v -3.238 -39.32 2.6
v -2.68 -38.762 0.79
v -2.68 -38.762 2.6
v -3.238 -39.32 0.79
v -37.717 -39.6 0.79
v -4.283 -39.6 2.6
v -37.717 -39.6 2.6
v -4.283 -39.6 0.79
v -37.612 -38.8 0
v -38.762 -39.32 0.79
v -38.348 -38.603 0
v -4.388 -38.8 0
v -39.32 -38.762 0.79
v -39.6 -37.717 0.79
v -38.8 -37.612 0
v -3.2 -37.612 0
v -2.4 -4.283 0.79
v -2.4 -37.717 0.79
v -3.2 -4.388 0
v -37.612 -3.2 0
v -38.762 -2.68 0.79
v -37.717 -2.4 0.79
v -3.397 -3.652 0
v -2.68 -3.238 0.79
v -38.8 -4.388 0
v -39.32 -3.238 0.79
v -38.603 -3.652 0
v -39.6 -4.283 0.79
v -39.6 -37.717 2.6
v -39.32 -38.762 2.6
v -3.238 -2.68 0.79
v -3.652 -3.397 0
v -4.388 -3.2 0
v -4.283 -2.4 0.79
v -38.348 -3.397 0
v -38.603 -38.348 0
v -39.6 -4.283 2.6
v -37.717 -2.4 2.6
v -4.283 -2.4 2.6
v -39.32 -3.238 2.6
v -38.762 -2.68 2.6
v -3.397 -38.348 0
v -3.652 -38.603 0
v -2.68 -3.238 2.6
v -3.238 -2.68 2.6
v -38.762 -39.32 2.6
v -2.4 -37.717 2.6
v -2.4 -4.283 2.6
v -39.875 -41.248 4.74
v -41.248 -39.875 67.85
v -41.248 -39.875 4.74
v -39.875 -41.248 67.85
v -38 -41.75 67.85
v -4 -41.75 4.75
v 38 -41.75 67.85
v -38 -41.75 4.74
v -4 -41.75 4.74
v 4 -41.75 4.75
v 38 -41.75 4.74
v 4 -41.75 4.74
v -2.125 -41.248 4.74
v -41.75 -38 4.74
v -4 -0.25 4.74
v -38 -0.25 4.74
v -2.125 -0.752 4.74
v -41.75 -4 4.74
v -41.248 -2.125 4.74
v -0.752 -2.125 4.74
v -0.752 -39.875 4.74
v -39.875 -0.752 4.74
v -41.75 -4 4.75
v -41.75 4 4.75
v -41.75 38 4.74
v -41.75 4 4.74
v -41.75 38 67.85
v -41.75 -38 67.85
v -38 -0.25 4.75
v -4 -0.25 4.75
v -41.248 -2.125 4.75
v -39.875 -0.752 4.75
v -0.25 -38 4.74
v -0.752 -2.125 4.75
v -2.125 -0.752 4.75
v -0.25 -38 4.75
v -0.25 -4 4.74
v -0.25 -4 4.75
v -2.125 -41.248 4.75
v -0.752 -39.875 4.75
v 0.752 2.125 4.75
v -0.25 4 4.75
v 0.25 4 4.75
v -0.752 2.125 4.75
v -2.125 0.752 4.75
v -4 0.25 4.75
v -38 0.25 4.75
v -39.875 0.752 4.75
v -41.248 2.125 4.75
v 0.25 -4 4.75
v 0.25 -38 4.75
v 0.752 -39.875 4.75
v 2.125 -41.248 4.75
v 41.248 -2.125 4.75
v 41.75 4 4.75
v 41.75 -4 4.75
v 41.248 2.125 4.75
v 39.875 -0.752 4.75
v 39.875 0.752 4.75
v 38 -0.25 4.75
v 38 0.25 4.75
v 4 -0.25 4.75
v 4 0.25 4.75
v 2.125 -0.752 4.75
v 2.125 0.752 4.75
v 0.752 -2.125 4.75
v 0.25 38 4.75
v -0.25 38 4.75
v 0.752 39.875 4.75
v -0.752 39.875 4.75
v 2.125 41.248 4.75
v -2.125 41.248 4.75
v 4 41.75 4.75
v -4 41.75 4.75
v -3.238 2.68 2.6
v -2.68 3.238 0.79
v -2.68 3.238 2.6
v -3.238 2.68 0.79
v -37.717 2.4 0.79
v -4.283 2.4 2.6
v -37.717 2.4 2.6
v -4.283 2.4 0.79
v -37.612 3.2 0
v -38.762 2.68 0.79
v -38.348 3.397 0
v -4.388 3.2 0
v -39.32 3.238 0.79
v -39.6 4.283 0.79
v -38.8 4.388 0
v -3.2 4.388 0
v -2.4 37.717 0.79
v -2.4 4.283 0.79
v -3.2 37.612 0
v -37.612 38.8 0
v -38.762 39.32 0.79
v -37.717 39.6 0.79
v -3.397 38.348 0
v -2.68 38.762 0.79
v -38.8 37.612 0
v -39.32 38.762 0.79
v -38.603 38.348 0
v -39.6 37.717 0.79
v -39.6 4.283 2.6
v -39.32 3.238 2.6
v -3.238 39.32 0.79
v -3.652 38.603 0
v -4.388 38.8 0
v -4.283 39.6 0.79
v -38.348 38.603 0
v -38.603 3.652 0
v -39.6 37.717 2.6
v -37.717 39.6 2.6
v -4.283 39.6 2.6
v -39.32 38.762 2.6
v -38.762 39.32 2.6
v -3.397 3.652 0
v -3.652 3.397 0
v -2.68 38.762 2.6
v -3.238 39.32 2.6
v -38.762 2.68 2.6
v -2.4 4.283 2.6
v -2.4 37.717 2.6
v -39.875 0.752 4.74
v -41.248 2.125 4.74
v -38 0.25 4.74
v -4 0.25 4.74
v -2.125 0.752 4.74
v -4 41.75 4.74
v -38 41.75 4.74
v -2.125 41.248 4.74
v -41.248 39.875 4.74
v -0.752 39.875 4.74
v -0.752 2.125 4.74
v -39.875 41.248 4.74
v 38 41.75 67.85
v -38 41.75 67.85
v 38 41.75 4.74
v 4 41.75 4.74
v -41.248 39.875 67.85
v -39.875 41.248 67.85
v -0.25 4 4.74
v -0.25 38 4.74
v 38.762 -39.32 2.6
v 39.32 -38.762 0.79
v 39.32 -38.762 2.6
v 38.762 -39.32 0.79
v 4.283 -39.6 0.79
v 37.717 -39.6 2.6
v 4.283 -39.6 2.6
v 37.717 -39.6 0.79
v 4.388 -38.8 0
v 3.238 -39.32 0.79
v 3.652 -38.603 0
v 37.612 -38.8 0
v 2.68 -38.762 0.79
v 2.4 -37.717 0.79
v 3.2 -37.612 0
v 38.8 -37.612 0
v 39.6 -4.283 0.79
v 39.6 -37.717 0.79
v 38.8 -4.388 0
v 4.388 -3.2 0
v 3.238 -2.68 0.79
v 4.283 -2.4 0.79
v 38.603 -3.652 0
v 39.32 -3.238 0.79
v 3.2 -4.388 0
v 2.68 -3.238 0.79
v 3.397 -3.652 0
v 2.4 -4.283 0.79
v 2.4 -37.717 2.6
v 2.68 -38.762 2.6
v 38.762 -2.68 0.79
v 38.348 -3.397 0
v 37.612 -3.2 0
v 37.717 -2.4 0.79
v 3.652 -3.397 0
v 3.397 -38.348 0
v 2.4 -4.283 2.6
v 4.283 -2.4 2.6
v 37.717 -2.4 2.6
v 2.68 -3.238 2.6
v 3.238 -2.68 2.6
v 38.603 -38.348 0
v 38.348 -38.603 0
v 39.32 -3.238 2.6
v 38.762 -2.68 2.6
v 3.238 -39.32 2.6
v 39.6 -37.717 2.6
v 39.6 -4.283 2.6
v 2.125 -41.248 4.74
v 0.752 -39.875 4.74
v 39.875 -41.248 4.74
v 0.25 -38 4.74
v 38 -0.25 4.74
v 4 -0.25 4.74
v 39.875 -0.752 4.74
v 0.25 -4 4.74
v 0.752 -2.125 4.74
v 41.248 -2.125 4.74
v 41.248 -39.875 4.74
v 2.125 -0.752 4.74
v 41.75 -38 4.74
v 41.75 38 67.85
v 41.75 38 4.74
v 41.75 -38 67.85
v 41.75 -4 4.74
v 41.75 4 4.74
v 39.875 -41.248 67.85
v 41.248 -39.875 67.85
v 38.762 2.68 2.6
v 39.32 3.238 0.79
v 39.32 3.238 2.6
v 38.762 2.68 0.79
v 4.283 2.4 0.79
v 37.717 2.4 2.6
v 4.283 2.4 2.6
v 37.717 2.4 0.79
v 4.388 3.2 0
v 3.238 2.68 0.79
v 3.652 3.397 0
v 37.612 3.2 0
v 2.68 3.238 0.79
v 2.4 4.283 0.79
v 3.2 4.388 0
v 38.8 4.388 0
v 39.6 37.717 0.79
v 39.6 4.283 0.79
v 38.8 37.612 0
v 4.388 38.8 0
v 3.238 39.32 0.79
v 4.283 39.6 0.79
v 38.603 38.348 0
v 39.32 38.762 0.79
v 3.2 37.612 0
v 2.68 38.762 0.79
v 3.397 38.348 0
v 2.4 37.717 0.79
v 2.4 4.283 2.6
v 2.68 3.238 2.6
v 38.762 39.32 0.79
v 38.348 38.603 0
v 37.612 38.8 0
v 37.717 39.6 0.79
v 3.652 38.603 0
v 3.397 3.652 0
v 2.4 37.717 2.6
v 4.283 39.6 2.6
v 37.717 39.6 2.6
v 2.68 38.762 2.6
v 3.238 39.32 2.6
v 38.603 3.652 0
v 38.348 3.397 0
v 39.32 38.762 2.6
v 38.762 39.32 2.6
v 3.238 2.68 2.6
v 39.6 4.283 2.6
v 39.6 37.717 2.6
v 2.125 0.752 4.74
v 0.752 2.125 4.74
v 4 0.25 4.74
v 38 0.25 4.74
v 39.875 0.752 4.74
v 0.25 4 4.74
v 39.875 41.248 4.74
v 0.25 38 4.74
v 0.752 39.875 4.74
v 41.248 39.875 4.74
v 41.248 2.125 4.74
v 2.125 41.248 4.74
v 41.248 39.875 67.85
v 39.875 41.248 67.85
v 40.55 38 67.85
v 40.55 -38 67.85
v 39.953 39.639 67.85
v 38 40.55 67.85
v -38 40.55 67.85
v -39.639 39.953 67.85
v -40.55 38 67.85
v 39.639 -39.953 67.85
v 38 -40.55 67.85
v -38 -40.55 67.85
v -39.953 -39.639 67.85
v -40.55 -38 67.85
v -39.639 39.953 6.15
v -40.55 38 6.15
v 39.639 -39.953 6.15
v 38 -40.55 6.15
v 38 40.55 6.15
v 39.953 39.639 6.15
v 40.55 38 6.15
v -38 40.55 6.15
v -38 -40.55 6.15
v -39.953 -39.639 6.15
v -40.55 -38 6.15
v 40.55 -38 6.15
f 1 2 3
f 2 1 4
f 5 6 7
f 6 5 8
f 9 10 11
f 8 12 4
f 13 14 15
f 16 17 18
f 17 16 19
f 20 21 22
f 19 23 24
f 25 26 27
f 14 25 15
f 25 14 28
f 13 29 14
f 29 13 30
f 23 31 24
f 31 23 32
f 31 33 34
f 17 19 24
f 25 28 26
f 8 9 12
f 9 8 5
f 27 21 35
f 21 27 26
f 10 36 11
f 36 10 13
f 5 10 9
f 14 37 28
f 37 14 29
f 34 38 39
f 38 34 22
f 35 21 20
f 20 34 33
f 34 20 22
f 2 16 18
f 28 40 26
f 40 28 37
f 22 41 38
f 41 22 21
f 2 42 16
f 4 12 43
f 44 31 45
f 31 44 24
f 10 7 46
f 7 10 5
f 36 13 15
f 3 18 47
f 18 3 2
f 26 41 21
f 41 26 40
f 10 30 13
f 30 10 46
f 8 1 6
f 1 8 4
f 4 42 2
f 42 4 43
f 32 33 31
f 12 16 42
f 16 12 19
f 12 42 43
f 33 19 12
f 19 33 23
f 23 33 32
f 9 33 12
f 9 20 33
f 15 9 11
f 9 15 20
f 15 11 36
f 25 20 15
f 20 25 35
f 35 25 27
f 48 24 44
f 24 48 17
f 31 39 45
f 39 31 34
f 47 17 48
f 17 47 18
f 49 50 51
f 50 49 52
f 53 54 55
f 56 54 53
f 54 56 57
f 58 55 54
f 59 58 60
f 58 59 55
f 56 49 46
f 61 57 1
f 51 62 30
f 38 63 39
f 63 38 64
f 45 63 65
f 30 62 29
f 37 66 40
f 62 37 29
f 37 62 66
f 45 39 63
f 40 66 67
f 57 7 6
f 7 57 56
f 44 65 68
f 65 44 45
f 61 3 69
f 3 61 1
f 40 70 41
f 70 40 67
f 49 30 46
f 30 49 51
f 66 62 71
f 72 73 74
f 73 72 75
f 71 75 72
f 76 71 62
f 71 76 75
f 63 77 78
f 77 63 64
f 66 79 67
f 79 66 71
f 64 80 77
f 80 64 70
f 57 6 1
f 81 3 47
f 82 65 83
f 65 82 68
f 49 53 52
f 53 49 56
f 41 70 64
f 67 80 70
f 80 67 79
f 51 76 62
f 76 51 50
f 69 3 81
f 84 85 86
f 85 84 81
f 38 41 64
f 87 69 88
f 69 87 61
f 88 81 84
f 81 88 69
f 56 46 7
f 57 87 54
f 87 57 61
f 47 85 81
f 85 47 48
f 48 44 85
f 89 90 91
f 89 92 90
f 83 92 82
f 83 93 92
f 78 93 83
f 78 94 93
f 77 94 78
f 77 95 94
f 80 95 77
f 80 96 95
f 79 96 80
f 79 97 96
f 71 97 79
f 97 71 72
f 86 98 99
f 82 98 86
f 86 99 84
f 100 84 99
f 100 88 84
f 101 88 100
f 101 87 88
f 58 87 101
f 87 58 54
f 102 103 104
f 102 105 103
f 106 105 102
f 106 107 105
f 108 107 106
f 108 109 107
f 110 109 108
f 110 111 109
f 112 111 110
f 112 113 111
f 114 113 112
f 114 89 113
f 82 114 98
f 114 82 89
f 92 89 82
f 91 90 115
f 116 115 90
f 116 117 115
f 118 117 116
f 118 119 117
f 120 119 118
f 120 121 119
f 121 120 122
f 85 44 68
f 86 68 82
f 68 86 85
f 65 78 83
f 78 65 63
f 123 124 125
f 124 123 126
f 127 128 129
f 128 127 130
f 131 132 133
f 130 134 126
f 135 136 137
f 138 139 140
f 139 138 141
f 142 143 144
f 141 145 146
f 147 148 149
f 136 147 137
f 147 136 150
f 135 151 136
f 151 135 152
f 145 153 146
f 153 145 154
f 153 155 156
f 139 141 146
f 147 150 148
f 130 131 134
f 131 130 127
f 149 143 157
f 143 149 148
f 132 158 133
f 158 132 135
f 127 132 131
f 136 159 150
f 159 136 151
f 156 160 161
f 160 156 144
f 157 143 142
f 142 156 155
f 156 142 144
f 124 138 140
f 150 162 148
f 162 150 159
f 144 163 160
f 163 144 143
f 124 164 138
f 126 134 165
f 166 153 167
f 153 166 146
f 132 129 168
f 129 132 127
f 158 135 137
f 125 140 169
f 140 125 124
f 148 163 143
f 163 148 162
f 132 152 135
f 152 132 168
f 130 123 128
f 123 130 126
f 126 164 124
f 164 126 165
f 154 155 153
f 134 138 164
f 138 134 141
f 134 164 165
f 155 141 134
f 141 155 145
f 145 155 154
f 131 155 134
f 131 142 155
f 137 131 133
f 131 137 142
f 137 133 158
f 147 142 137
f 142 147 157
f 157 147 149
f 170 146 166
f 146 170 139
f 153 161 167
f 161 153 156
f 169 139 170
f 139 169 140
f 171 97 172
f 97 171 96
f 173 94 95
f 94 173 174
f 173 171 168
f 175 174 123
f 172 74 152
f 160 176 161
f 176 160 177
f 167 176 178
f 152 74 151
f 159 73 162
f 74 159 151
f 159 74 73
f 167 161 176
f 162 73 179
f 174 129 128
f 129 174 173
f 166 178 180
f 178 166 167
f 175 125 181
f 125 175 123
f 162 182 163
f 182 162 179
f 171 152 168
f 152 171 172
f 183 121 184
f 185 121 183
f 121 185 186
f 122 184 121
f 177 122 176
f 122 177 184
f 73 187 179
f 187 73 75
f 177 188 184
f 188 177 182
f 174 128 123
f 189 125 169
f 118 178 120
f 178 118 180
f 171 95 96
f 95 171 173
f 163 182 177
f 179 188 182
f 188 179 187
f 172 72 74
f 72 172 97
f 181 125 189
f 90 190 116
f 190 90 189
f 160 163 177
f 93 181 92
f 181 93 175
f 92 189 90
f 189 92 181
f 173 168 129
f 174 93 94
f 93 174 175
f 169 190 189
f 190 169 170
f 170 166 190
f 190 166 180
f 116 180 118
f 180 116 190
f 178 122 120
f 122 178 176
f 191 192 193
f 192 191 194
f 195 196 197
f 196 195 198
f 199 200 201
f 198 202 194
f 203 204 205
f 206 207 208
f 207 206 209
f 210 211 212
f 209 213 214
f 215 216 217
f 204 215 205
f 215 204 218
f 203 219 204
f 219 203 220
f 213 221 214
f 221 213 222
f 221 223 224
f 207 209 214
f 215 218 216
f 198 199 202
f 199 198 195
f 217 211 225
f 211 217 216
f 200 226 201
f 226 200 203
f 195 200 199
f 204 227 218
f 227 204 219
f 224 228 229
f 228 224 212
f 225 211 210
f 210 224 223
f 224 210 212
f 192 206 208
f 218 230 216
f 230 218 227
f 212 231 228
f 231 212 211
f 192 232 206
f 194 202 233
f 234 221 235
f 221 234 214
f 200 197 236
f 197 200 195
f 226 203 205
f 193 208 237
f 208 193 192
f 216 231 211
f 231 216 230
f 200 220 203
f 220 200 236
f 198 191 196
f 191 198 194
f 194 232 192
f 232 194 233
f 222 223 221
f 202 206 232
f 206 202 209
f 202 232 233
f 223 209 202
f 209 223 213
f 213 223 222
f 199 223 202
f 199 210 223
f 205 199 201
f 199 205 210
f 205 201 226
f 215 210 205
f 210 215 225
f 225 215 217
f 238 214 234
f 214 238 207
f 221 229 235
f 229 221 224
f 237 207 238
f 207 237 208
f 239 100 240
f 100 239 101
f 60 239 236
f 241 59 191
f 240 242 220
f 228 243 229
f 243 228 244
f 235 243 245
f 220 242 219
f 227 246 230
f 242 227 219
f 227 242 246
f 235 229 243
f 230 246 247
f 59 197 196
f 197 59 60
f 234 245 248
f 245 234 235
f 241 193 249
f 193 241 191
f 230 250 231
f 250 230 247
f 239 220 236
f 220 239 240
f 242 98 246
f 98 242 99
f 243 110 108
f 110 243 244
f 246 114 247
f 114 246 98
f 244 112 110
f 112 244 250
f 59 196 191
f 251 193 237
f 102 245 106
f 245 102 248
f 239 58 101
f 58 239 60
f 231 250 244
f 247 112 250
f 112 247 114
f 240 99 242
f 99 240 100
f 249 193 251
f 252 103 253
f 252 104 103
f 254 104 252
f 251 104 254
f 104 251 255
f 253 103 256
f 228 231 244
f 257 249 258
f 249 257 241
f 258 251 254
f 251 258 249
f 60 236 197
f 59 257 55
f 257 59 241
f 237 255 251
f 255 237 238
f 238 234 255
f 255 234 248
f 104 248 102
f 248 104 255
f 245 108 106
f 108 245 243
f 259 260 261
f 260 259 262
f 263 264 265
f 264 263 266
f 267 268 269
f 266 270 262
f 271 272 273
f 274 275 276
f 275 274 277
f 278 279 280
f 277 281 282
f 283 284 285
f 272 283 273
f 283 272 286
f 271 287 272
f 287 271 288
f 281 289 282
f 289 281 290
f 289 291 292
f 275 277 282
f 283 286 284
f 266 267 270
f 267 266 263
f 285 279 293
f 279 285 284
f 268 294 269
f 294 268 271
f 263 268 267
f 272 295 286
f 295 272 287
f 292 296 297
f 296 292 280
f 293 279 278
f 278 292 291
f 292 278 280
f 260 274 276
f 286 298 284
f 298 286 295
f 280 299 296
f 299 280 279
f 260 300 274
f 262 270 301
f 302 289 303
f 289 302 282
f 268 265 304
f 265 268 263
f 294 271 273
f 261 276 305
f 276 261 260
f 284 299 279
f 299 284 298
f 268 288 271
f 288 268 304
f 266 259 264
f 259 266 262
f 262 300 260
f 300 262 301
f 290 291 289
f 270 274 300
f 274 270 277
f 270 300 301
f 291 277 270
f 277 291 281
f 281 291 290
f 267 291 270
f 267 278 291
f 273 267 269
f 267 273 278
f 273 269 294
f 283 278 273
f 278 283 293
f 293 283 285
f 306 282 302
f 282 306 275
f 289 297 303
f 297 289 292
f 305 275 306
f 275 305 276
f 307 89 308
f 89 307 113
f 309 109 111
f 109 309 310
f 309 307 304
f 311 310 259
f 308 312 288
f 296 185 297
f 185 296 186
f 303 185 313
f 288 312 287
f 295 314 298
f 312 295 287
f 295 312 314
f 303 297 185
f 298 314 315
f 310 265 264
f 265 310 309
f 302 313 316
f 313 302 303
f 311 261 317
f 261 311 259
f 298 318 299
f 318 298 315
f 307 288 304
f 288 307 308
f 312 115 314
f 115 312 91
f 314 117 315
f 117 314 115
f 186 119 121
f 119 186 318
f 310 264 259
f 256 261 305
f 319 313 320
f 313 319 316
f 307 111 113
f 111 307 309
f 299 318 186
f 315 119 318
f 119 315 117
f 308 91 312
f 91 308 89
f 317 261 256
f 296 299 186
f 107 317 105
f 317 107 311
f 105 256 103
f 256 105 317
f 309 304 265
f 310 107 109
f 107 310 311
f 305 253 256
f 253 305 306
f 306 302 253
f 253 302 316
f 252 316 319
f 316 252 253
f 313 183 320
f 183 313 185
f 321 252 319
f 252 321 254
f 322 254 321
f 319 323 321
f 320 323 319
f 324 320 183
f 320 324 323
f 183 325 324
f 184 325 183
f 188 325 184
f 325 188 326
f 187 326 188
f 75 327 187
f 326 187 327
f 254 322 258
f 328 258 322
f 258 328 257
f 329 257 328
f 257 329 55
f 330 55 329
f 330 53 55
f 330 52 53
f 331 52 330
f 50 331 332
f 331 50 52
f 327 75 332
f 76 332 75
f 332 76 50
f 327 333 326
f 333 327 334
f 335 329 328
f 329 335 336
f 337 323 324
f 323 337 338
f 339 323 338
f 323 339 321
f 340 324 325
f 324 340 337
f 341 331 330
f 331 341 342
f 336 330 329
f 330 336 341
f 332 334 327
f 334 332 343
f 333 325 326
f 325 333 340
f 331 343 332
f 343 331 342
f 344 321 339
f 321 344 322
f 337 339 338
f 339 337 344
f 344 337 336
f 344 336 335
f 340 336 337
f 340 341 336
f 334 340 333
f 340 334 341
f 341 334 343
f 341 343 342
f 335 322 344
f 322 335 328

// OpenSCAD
// file: ../lib/vessel.scad
// SPDX-License-Identifier: MIT
// Copyright (c) 2026 Aaron Cupp
//
// vessel.scad — parametric collar cups for bottles, cans, and pen-form tools.
//
// A collar cup is a solid Gridfinity block with cylindrical bores sunk into it.
// It LOCATES a vessel; it does not clamp one. That distinction is the whole
// design: a collar that grips harder than the bin weighs comes out of the
// baseplate with the bottle when you grab it one-handed. Clearance, not
// interference — CLR is per-diameter, not per-side.
//
// Capture depth is roughly a third of the vessel's height. Enough to resist a
// knock (this bench sits under a 180 W fume-extractor intake), not so much that
// you're fishing the bottle out.
//
//   collar_cup(nx, ny, vessel_d, capture_h, …)   — one centred bore
//   collar_cup_multi(nx, ny, bores, capture_h, …) — bores = [[x, y, d], …]
//
// Cord slot: pen-form tools that stand in a cup are usually corded (the HARDELL
// rotary tool takes a barrel jack). Without a slot the lead drapes over the rim
// and levers the tool sideways. `cord_w > 0` cuts a channel from the bore out
// through the wall, open to the top.

include <gridfinity.scad>

CLR      = 1.0;   // bore = vessel_d + CLR. Loose on purpose — see above.
MIN_WALL = 1.2;   // minimum material between two bores, and bore to outer face

// ---- geometry guards ----
// Overlapping bores and bores that break out through the side wall both still
// render as perfectly watertight, 2-manifold meshes — CI cannot tell you the
// part is wrong, only that it is closed. These asserts encode the intent that
// the mesh check can't. Cheap, and they fire at render time rather than on the
// printer.
function _pair_gaps(bores, clr) = [
    for (i = [0 : len(bores)-1], j = [0 : len(bores)-1]) if (i < j)
        norm([bores[i][0]-bores[j][0], bores[i][1]-bores[j][1]])
        - (bores[i][2]+clr)/2 - (bores[j][2]+clr)/2
];
function _edge_gaps(bores, clr, W, D) = [
    for (b = bores) min(W/2 - abs(b[0]) - (b[2]+clr)/2,
                        D/2 - abs(b[1]) - (b[2]+clr)/2)
];

// Multi-bore block. Bores are [x, y, diameter] in mm, relative to the block centre.
module collar_cup_multi(nx, ny, bores, capture_h, floor = 1.4, clr = CLR,
                        cord_w = 0, cord_at = 0, min_wall = MIN_WALL) {
    h = BIN_BASE_H + floor + capture_h;
    e = 0.1;
    W = nx*GF - 0.5; D = ny*GF - 0.5;
    _pg = _pair_gaps(bores, clr);
    _eg = _edge_gaps(bores, clr, W, D);
    assert(len(_pg) == 0 || min(_pg) >= min_wall,
           "collar_cup: bores are too close — they would merge into one pocket");
    assert(min(_eg) >= min_wall,
           "collar_cup: a bore breaches the outer wall — block needs more units");
    difference() {
        bin_blank(nx, ny, h);
        for (b = bores)
            translate([b[0], b[1], BIN_BASE_H + floor])
                cylinder(d = b[2] + clr, h = capture_h + e, $fn = 96);
        // Cord channel: from the first bore outward through the +X wall, open to
        // the rim so the lead drops in from above rather than threading.
        if (cord_w > 0)
            translate([bores[0][0], bores[0][1] - cord_w/2, BIN_BASE_H + floor + cord_at])
                cube([nx*GF, cord_w, h]);
    }
}

// Single centred bore — the common case.
module collar_cup(nx, ny, vessel_d, capture_h, floor = 1.4, clr = CLR,
                  cord_w = 0, cord_at = 0, min_wall = MIN_WALL) {
    collar_cup_multi(nx, ny, [[0, 0, vessel_d]], capture_h, floor, clr,
                     cord_w, cord_at, min_wall);
}

// Evenly spaced row of same-depth bores along X — for a rank of aerosol cans.
// Returns geometry, not a list; pass the diameters and it lays them out on the
// block's centre line.
module collar_cup_row(nx, ny, diameters, capture_h, floor = 1.4, clr = CLR,
                      min_wall = MIN_WALL) {
    n = len(diameters);
    pitch = nx * GF / n;
    collar_cup_multi(nx, ny,
        [for (i = [0 : n-1]) [(i - (n-1)/2) * pitch, 0, diameters[i]]],
        capture_h, floor, clr, 0, 0, min_wall);
}
// file: cleaning_station_common.scad
// cleaning_station_common.scad — shared parameters for the bench cleaning station.
//
// The IPA / contact-cleaner corner of the electronics repair bench. Everything
// here is measured off the actual items with calipers; nothing is a nominal from
// a product page. Diameters carry a per-diameter clearance (lib/vessel.scad CLR),
// not per-side.
//
// This corner sits under a fume-extractor intake, which drives two decisions:
//   * Cups CAPTURE the vessel rather than clamp it — a collar that grips harder
//     than the bin weighs lifts out of the baseplate with the bottle.
//   * Bins stay as low as the job allows. Capture velocity is decided in the
//     first six inches, and a wall of tall bins in front of the hood costs it.
//
// The aerosols are FLAMMABLE and this bench has a 400 °C iron on it. These cups
// are for working cans only; bulk stock belongs away from the hood entirely.
//
// SPDX-License-Identifier: CC-BY-NC-SA-4.0
// Copyright (c) 2026 Aaron Cupp

include <../lib/vessel.scad>

// ---- measured diameters (mm) ----
// DeoxIT bore: taken from the PART, not from a can measurement.
//
// The 2026-08-20 print had three bores — 57.00 / 55.20 / 52.75. The 57.00 fits a
// DeoxIT; 55.20 barely does; 52.75 holds nothing. So 57.00 is a validated bore,
// which beats re-deriving it from a can diameter plus a clearance guess. D5, F5
// and G5 are the same can, so one bore serves all three.
BORE_DEOXIT = 57.00;   // ✅ proven by the printed part

// Freeze spray is a DIFFERENT, LARGER can — 13 mm wider than a DeoxIT, which is
// why it never fitted a shared block.
D_FREEZE_SPRAY = 69.00;   // ✅ measured 2026-08-20 (was 56.00, badly wrong)
FREEZE_CLR     = 2.0;     // [1:0.5:4] -> 71.00 bore
FREEZE_MEASURED = true;

D_DISPENSER    = 53.50;   // 200 ml push-down alcohol pump, square base across flats
D_FLOOD_BOTTLE = 75.50;

// DeoxIT D100 / F100 / G100 concentrate droppers — bare bottles, out of their
// kit boxes. The boxes are a full 2×1 EACH; the three bare bottles share one.
// NOT ROUND — 39 × 20 is a flattened cross-section, not a diameter and a height.
D_DROPPER_L = 39.00;   // measured 2026-08-20, long axis of the footprint
D_DROPPER_W = 20.00;   // measured, short axis
DROPPER_CLR = 1.00;    // per dimension, matching the CLR convention
CAP_DROPPER = 26;      // [8:1:40] capture depth. ⚠️ bottle HEIGHT is unmeasured —
                       //   39 turned out to be a footprint, so the height nobody
                       //   has taken.
                       //   RAISED 15 → 26 on 2026-08-24: at 15 the brushes and
                       //   swabs fell over in their slots. Depth is what resists
                       //   an applicator tipping, and 15 mm of it on a ~100 mm
                       //   brush is almost none. 26 makes the whole block half
                       //   again as tall, which is what was asked for.
                       //   Read the bin_deoxit_droppers header before assuming
                       //   this alone fixes the tipping — it does not.

// ---- melamine sponges (mm) — 3.94 × 2.35 × 0.79 in ----
// Full block as sold. Bulk stock lives in the bag under the desk, ~100 of them;
// none of it competes for grid.
SPONGE_L = 100.1; SPONGE_W = 59.7; SPONGE_T = 20.1;

// WORKING size: a full block is far more sponge than any bench task needs, and
// melamine is consumed by abrasion — quartering one gets four uses out of what
// was one, and the smaller piece reaches between connectors where a 100 mm block
// cannot. Halve across, halve lengthwise.
CUT_L = SPONGE_L / 2;   // 50.05
CUT_W = SPONGE_W / 2;   // 29.85
CUT_T = SPONGE_T;       // 20.1 — unchanged, cuts are through the face

// ---- capture depth ----
// Vessel HEIGHTS were not measured, so this is a judgement call rather than a
// derived third-of-height: 50 mm resists a knock without making the bottles a
// two-handed retrieval. One number to change if the first print feels wrong.
CAPTURE = 50;

// Sponge bin: sponges stand ON EDGE (60 mm tall), ~4 across the 81 mm interior.
// On edge beats flat-stacked — same count in a 68 mm bin instead of a 107 mm one,
// and any sponge can be pinched out rather than peeling off the top of a pile.
// Height is set by a FULL block standing on edge, not a cut one — so one uncut
// block can still ride in the bin as reserve alongside the trimmed pieces.
// Cut pieces are 50 long, which is what lets the footprint drop to 2×2.
SPONGE_BIN_H = SPONGE_W + BIN_BASE_H + 1.4 + 2;   // ≈ 68
// main file
// bin_sponges — 2×2 bin for melamine sponges cut to working size.
//
// 2×2, not 3×2. A full 100.1 mm block does not fit a 2×2's 81 mm interior, but
// nothing here stores full blocks: they get quartered (CUT_L 50.05 × CUT_W 29.85)
// because a whole block is more sponge than any bench job needs and melamine is
// consumed by abrasion. Bulk stock stays in the bag under the desk.
//
// The height still allows a FULL block on edge, so one uncut reserve can ride
// along with the trimmed pieces.
//
// Dropping to 2×2 is what lets base_swabs stack under it at 2×2 as well — a
// third less grid than the old 3×2 tower.
//
// PRINT: as emitted, feet down. No supports.
//
// SPDX-License-Identifier: CC-BY-NC-SA-4.0
// Copyright (c) 2026 Aaron Cupp
include <cleaning_station_common.scad>
bin(2, 2, SPONGE_BIN_H);
